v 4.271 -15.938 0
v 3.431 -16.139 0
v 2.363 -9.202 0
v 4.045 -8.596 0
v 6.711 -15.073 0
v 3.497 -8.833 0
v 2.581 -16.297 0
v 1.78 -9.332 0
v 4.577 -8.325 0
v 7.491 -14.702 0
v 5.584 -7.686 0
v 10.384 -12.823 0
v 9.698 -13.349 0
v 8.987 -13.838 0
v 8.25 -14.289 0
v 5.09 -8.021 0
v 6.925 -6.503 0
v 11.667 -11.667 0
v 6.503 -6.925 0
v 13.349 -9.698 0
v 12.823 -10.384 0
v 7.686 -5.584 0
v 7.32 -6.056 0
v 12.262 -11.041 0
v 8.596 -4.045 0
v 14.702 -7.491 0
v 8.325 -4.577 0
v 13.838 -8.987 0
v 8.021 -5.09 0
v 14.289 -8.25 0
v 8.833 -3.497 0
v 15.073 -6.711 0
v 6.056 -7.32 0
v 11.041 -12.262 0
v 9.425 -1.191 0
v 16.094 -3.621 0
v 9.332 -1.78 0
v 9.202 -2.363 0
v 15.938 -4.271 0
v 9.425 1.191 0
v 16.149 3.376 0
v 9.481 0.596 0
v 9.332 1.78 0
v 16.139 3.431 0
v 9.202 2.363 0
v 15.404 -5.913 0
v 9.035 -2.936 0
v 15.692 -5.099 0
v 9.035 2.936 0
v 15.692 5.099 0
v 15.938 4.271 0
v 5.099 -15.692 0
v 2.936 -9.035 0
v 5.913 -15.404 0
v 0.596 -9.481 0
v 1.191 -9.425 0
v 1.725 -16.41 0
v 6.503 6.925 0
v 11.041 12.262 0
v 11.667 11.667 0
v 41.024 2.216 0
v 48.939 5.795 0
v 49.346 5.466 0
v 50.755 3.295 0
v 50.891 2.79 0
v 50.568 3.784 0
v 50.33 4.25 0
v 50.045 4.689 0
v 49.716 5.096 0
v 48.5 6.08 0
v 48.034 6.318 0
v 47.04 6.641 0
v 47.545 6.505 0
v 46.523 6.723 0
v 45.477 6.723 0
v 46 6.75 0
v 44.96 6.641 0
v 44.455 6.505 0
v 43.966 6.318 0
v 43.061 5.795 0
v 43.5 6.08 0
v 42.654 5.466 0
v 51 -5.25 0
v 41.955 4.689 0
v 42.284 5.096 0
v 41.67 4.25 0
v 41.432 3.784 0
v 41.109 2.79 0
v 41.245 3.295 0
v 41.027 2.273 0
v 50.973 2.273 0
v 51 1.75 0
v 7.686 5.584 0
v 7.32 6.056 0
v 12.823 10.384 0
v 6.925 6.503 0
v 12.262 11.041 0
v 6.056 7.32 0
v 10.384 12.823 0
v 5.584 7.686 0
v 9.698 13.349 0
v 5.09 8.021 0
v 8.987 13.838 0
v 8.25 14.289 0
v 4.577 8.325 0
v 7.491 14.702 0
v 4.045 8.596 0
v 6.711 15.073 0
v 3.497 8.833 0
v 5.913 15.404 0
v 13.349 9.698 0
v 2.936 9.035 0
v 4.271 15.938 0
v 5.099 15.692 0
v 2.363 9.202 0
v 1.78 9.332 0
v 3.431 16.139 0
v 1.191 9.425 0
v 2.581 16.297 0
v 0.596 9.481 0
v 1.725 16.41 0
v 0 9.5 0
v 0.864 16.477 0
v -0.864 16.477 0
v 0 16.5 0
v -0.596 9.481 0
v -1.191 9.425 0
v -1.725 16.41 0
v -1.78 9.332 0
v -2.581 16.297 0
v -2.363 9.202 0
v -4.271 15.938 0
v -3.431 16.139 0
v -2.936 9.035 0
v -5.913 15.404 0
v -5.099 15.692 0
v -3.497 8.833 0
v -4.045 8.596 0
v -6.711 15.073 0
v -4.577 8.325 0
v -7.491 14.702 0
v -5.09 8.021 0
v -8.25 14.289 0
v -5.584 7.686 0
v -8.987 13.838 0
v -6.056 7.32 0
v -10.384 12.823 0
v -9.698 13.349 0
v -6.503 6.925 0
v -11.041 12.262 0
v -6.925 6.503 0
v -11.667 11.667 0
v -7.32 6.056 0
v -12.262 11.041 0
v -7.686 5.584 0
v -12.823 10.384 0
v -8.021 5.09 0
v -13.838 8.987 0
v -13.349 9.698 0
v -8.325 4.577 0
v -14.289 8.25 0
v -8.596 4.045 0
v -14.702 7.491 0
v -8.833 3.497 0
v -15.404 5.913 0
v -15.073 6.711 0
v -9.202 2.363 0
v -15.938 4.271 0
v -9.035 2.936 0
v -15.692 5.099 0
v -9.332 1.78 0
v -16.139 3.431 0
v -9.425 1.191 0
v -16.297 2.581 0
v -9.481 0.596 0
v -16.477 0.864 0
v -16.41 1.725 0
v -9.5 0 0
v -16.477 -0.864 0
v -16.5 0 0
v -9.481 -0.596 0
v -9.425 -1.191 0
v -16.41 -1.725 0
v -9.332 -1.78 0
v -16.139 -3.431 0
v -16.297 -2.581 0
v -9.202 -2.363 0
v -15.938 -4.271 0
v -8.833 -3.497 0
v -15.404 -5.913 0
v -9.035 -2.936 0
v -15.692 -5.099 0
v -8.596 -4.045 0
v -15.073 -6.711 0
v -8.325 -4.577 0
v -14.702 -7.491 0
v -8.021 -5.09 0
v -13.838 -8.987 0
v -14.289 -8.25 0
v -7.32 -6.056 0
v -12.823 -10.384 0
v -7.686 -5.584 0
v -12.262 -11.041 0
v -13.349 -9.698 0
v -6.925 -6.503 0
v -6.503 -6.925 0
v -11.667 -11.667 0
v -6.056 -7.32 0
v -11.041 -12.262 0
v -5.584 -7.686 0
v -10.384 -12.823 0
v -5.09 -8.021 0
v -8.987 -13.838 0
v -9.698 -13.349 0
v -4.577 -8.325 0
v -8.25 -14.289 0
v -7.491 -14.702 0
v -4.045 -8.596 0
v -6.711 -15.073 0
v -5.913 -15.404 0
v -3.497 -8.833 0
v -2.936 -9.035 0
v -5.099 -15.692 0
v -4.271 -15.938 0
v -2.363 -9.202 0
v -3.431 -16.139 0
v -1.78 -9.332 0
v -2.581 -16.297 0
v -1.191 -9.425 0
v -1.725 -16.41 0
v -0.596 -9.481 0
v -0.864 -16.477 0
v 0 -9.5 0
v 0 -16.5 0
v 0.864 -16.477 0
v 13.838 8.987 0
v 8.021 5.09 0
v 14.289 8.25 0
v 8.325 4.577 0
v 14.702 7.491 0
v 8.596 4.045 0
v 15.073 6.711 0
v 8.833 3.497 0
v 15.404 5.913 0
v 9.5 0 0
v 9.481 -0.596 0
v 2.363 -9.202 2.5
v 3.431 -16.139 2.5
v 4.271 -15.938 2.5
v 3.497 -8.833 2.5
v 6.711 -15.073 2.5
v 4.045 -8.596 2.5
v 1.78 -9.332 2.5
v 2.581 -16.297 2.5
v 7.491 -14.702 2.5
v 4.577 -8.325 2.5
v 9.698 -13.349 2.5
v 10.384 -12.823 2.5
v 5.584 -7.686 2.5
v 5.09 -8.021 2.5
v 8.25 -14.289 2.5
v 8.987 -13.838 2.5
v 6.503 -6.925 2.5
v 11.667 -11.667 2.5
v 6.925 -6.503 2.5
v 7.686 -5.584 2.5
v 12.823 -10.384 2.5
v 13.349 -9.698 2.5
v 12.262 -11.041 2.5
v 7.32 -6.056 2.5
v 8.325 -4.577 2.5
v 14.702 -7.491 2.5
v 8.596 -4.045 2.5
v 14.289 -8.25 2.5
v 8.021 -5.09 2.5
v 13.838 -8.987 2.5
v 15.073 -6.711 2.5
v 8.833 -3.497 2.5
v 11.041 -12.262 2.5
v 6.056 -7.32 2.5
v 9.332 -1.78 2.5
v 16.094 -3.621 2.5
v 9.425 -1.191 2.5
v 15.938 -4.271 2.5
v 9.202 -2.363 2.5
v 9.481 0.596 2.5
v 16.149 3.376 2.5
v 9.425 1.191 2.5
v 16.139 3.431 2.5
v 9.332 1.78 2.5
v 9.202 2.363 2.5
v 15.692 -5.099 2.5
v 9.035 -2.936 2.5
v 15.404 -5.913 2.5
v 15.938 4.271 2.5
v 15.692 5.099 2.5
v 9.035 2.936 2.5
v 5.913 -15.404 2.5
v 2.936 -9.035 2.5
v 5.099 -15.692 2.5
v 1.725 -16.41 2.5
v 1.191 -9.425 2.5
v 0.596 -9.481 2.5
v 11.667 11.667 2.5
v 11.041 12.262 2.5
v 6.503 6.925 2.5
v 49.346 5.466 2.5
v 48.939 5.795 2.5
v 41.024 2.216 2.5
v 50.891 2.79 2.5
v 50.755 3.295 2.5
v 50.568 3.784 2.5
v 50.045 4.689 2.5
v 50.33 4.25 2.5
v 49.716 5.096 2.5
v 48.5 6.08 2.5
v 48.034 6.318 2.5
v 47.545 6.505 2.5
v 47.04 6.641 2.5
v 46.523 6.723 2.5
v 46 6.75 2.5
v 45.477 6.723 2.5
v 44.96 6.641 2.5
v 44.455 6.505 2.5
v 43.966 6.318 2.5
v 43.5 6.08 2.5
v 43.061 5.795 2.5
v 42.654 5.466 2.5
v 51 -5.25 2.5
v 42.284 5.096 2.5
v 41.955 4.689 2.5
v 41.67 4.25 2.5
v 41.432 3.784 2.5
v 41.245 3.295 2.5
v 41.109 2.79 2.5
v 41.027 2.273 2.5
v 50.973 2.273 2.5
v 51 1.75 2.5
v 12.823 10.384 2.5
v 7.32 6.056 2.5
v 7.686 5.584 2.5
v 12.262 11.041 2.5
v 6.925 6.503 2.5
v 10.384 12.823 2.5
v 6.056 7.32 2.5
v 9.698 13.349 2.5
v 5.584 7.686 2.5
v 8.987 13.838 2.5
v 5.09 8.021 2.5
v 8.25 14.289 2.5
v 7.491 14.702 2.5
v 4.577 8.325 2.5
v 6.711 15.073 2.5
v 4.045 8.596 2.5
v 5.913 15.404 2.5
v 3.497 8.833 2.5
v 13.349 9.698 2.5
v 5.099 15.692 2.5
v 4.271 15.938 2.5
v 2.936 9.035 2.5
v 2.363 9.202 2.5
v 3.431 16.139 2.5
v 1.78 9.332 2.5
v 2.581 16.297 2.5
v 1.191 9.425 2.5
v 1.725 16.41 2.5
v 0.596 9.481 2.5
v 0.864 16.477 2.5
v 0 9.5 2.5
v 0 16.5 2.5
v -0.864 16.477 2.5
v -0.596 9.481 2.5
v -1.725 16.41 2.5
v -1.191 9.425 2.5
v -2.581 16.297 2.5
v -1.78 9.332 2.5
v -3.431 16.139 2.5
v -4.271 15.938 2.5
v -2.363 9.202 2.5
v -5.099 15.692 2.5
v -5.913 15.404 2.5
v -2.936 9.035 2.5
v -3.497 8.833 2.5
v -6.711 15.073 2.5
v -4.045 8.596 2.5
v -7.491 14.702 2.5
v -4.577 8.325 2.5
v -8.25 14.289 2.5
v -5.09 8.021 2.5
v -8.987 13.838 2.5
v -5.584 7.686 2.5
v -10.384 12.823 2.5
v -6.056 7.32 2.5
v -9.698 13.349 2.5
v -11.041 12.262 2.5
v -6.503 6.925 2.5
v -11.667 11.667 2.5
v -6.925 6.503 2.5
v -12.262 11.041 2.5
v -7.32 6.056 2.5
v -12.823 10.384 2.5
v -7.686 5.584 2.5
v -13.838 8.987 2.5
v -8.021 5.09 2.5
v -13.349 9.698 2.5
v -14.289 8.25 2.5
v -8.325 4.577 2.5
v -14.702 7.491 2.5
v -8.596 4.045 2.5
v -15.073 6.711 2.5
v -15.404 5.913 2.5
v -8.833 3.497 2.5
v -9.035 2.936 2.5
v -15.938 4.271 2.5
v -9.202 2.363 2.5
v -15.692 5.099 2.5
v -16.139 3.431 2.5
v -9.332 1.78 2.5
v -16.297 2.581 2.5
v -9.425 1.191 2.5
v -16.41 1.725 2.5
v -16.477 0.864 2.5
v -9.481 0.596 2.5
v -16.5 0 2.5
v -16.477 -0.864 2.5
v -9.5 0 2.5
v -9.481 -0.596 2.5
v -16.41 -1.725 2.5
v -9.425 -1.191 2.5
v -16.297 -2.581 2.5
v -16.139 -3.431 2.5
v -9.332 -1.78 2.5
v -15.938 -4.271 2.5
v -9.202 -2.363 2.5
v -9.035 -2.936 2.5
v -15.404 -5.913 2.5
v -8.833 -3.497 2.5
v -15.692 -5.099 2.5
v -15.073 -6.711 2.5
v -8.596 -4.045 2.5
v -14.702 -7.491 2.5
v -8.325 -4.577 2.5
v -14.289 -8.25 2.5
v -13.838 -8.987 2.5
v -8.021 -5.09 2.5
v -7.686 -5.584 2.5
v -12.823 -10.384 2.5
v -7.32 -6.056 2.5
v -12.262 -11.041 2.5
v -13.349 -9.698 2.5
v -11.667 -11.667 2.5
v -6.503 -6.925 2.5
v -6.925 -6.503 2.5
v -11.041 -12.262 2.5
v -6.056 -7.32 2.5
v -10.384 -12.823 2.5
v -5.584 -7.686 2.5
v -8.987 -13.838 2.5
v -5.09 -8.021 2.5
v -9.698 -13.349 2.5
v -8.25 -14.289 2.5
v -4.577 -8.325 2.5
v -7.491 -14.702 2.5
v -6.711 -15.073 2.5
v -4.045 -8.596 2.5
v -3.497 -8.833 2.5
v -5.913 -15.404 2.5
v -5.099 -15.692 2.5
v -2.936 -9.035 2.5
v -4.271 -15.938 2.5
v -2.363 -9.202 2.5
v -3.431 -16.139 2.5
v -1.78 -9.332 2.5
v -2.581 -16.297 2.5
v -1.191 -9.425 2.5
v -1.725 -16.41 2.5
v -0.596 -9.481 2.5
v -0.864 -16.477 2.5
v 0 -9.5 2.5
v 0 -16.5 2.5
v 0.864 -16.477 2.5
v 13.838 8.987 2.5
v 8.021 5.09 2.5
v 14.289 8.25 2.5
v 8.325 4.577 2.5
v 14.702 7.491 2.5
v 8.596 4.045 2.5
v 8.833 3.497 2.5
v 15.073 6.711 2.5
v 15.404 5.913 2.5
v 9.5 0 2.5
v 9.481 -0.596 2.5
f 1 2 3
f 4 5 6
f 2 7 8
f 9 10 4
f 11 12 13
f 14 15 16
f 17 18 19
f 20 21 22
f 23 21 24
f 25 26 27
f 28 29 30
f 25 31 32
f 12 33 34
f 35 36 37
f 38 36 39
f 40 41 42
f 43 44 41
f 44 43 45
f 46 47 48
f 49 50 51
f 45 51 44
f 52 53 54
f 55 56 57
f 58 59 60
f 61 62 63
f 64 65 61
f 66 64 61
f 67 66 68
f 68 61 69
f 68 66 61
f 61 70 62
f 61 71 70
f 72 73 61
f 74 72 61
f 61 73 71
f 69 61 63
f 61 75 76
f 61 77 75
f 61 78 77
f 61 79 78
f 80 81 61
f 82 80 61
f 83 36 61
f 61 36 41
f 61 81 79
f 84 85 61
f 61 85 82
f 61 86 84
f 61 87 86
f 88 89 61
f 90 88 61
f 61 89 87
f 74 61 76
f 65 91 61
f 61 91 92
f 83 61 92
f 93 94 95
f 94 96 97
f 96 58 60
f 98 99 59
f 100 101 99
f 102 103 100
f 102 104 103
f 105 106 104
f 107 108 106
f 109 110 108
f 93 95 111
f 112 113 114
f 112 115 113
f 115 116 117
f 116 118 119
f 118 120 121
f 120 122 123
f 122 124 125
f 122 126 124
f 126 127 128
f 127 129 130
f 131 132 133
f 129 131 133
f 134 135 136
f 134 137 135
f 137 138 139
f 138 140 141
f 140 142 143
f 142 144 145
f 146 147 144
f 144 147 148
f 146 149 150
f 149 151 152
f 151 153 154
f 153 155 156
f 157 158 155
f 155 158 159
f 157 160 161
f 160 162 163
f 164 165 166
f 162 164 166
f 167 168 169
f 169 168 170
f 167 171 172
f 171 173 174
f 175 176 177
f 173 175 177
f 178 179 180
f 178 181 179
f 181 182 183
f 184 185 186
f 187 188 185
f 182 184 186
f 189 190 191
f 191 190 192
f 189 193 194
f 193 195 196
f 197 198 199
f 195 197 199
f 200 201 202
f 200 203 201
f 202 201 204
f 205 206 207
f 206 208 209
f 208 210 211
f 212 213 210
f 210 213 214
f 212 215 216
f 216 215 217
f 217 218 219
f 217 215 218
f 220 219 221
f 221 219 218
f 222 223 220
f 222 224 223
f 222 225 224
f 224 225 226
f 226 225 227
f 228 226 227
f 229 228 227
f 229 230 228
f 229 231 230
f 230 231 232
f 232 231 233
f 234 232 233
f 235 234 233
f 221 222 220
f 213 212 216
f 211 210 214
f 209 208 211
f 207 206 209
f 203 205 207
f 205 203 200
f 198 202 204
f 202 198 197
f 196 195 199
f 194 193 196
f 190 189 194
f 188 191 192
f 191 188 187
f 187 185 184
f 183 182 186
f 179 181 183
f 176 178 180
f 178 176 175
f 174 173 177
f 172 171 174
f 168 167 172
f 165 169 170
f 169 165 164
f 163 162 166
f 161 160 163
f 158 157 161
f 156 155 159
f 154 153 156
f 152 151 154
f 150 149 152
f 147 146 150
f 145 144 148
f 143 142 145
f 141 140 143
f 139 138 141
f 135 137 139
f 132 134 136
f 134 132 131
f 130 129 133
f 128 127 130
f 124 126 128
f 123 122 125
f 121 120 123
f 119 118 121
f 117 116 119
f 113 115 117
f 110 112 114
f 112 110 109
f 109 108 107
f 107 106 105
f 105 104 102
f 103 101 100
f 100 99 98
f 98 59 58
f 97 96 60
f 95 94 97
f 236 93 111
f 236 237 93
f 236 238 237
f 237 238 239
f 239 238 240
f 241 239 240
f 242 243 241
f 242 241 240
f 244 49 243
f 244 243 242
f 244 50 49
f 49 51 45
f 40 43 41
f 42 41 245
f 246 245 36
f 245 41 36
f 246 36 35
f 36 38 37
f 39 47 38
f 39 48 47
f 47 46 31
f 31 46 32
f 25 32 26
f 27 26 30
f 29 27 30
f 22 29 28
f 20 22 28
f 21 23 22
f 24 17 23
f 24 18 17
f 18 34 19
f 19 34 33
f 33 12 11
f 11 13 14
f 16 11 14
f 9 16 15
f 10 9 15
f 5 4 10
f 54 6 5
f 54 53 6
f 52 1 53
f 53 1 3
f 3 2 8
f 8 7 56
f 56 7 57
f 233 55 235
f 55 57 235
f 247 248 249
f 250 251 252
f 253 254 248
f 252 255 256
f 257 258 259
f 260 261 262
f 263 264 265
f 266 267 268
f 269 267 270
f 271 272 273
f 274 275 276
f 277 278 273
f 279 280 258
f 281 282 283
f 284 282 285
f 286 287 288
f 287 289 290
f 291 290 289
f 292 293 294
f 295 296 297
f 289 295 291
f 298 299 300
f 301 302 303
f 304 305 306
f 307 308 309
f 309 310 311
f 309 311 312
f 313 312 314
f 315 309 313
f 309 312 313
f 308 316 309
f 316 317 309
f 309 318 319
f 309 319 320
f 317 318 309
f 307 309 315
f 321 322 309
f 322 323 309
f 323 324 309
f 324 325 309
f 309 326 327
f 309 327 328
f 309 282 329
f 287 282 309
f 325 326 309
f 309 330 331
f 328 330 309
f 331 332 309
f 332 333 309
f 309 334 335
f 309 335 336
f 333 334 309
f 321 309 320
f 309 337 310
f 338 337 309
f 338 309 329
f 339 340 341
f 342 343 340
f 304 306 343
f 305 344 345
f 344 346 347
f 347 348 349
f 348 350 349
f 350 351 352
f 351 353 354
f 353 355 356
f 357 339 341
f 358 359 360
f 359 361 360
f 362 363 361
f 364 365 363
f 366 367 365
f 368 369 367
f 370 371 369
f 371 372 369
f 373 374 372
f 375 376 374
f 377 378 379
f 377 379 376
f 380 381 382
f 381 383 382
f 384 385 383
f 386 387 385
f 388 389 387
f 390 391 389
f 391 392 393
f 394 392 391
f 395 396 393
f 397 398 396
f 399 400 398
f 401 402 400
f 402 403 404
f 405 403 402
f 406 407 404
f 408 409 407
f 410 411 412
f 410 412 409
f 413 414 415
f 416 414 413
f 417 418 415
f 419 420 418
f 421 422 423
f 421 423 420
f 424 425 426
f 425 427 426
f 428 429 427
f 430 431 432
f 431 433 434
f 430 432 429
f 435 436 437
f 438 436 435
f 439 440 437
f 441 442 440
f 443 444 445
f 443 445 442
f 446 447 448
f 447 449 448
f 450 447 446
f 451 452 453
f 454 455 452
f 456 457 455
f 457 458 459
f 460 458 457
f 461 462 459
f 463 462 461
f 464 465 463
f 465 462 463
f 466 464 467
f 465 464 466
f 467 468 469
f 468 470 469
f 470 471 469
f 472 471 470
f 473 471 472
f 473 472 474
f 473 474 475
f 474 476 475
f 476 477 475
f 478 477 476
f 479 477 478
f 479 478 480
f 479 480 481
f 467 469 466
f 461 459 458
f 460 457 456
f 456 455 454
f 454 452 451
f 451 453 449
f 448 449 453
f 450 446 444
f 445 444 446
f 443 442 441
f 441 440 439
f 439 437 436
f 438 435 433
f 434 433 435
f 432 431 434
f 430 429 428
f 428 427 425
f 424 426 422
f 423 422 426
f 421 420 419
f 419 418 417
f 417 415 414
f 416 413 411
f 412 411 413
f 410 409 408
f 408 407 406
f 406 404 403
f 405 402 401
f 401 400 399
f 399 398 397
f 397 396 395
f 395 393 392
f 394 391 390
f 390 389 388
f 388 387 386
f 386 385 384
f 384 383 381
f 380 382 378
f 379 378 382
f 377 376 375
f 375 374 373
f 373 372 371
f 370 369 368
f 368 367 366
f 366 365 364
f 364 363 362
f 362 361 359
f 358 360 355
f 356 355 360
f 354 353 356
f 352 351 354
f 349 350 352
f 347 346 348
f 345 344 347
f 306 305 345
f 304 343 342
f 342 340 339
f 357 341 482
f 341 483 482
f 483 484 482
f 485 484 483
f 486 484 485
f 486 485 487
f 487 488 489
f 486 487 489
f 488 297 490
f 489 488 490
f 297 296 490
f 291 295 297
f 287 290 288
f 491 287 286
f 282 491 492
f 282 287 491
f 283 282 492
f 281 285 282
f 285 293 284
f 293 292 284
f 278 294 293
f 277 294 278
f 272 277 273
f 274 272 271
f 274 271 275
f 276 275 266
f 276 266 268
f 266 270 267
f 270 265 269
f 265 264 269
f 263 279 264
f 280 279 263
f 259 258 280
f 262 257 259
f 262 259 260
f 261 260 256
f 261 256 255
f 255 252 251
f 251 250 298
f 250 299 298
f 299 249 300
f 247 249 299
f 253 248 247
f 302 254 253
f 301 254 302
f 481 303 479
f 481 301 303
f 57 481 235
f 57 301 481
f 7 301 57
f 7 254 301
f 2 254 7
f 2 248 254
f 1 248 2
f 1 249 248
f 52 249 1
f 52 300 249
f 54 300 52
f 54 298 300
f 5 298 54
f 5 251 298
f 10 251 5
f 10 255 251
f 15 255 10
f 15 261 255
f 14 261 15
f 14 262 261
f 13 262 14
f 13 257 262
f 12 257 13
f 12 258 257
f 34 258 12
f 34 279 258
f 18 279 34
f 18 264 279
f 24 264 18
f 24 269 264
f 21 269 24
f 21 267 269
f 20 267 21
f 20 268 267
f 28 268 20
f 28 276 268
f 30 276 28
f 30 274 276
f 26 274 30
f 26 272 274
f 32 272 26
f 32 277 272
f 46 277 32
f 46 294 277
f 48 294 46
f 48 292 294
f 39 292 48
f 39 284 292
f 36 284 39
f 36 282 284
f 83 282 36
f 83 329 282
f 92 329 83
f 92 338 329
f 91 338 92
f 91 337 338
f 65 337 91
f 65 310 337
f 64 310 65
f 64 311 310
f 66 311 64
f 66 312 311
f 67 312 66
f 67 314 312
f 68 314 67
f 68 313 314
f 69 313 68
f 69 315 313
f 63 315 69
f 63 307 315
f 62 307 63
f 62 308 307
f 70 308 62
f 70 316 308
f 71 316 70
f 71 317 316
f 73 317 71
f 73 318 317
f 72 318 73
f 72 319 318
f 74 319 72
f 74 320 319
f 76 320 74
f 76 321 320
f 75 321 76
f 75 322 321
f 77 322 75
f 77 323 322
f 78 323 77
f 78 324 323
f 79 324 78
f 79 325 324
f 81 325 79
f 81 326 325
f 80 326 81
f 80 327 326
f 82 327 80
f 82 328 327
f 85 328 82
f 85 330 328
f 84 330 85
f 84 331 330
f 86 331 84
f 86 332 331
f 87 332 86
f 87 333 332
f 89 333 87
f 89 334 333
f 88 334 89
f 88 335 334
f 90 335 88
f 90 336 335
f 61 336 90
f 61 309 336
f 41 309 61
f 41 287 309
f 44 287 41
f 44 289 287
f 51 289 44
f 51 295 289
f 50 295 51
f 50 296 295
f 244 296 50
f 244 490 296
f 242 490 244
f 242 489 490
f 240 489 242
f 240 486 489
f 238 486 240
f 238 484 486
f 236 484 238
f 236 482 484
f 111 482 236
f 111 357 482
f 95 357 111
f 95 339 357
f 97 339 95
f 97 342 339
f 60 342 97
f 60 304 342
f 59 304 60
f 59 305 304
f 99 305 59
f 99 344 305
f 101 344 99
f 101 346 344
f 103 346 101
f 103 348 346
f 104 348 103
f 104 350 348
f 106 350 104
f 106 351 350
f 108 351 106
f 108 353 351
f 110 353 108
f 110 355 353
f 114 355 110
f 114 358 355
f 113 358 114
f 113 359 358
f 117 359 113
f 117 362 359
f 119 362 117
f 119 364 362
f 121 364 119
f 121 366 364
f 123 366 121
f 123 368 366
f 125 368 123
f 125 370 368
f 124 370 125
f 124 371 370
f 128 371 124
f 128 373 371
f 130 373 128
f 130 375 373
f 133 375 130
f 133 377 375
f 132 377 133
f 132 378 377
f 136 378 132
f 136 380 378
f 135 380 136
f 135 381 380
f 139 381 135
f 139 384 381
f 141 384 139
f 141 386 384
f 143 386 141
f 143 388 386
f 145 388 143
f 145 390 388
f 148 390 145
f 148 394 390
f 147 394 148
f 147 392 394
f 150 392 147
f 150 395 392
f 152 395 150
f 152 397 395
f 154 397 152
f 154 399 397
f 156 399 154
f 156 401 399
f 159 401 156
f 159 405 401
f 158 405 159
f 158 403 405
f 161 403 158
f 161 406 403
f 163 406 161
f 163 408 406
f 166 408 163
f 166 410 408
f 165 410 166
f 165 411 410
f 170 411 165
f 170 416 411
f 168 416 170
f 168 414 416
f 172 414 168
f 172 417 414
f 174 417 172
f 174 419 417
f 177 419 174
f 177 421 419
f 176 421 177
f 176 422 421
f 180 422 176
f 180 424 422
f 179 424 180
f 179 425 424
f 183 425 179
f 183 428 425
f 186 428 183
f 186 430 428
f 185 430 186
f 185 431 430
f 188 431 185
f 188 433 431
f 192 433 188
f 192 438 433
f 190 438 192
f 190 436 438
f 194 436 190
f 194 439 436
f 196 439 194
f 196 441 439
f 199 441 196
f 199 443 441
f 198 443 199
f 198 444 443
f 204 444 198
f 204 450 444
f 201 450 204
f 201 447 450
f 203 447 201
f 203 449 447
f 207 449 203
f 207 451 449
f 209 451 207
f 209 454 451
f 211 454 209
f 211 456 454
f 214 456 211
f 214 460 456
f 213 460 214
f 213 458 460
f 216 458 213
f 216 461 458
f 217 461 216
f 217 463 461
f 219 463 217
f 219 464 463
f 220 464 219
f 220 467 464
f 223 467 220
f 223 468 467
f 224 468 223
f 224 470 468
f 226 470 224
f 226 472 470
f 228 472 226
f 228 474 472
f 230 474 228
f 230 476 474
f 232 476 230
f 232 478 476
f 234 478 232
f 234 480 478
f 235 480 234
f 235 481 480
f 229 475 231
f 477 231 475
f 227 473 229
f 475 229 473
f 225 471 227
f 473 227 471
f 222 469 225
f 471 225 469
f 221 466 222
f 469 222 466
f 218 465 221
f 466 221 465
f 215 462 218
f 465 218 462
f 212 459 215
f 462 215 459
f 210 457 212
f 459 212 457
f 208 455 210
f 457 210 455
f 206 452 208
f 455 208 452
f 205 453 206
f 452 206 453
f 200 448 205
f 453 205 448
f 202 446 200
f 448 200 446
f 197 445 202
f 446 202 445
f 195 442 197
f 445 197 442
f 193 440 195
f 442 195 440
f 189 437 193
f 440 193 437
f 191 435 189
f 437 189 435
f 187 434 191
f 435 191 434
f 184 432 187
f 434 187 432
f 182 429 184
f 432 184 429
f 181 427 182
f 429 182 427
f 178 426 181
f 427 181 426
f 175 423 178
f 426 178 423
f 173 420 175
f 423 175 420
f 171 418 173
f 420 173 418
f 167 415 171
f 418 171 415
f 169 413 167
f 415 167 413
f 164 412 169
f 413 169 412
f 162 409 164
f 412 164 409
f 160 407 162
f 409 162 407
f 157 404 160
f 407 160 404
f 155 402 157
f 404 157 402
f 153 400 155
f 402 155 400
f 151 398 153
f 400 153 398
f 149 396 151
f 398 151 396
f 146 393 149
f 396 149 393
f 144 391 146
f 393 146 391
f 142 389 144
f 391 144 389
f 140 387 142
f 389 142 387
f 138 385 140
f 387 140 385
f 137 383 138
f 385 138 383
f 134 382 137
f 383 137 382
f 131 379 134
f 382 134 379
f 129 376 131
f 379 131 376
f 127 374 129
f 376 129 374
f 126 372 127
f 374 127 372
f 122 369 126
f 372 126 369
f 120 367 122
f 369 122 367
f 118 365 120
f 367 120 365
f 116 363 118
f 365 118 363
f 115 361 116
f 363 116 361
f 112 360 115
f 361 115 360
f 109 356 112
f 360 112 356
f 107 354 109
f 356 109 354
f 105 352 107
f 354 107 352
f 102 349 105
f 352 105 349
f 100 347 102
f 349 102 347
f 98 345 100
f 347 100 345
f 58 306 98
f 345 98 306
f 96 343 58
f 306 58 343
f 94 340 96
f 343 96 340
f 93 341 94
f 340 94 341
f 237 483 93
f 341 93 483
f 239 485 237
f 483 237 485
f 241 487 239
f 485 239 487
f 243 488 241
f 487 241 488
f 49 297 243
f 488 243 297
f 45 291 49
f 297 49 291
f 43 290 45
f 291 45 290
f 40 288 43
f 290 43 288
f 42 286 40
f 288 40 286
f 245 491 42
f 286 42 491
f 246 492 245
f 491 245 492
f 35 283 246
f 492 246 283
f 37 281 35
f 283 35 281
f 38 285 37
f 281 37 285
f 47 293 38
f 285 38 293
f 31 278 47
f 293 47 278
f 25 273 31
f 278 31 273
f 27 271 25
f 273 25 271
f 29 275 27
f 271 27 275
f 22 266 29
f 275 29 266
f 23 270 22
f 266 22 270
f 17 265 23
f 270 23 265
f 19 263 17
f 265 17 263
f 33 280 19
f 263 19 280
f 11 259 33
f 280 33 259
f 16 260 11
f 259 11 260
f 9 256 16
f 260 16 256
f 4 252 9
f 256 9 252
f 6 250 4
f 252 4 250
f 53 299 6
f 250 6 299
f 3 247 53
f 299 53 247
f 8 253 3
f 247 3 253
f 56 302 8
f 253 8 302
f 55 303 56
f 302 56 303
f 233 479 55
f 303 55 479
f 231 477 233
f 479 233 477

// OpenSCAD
// part_id: sp9
// name: SP9 Jupiter/Mars latch
// source_drawing_ids: DRW-022
// units: mm
// revision: 0.1-drw022
// SPDX-License-Identifier: MIT
//
// Dimensions from DRW-022 sheet 6:
//   Circular head: R16.5 outer, R9.5 inner lightening cutout, Ø4.0 pivot hole.
//   Arm: total length 51 mm, two segments 32.0 + 12.0 mm, tail R5 radius.
//   Fillet radii: R4 at root, R3 at transitions.
//   Thickness: 2.5 mm (placeholder, not explicitly dimensioned on sheet).

module part_sp9(
    thickness  = 2.5,
    head_r     = 16.5,
    inner_r    = 9.5,
    pivot_d    = 4.0,
    total_len  = 51.0,
    arm_w_root = 7.0,
    arm_w_tip  = 3.5,
    tail_r     = 5.0
) {
    arm_start_x = head_r - 3.0;
    arm_len     = total_len - arm_start_x;

    linear_extrude(height = thickness) {
        difference() {
            union() {
                // Circular head.
                circle(r = head_r, $fn = 120);
                // Tapered arm body extending from head.
                translate([arm_start_x, -arm_w_root / 2])
                    polygon([
                        [0,        0],
                        [arm_len,  -(arm_w_root - arm_w_tip) / 2],
                        [arm_len,   arm_w_tip + (arm_w_root - arm_w_tip) / 2],
                        [0,        arm_w_root]
                    ]);
                // Rounded tail cap.
                translate([total_len - tail_r, arm_w_root / 2 - (arm_w_root - arm_w_tip) / 2])
                    circle(r = tail_r, $fn = 60);
            }
            // Center pivot hole.
            circle(d = pivot_d, $fn = 40);
            // Inner head lightening cutout.
            circle(r = inner_r, $fn = 100);
        }
    }
}


// ---- "main guard" ----
// Default to previewing when opened directly:
if (is_undef(__LIB_MODE__)) {
    part_sp9();
}
